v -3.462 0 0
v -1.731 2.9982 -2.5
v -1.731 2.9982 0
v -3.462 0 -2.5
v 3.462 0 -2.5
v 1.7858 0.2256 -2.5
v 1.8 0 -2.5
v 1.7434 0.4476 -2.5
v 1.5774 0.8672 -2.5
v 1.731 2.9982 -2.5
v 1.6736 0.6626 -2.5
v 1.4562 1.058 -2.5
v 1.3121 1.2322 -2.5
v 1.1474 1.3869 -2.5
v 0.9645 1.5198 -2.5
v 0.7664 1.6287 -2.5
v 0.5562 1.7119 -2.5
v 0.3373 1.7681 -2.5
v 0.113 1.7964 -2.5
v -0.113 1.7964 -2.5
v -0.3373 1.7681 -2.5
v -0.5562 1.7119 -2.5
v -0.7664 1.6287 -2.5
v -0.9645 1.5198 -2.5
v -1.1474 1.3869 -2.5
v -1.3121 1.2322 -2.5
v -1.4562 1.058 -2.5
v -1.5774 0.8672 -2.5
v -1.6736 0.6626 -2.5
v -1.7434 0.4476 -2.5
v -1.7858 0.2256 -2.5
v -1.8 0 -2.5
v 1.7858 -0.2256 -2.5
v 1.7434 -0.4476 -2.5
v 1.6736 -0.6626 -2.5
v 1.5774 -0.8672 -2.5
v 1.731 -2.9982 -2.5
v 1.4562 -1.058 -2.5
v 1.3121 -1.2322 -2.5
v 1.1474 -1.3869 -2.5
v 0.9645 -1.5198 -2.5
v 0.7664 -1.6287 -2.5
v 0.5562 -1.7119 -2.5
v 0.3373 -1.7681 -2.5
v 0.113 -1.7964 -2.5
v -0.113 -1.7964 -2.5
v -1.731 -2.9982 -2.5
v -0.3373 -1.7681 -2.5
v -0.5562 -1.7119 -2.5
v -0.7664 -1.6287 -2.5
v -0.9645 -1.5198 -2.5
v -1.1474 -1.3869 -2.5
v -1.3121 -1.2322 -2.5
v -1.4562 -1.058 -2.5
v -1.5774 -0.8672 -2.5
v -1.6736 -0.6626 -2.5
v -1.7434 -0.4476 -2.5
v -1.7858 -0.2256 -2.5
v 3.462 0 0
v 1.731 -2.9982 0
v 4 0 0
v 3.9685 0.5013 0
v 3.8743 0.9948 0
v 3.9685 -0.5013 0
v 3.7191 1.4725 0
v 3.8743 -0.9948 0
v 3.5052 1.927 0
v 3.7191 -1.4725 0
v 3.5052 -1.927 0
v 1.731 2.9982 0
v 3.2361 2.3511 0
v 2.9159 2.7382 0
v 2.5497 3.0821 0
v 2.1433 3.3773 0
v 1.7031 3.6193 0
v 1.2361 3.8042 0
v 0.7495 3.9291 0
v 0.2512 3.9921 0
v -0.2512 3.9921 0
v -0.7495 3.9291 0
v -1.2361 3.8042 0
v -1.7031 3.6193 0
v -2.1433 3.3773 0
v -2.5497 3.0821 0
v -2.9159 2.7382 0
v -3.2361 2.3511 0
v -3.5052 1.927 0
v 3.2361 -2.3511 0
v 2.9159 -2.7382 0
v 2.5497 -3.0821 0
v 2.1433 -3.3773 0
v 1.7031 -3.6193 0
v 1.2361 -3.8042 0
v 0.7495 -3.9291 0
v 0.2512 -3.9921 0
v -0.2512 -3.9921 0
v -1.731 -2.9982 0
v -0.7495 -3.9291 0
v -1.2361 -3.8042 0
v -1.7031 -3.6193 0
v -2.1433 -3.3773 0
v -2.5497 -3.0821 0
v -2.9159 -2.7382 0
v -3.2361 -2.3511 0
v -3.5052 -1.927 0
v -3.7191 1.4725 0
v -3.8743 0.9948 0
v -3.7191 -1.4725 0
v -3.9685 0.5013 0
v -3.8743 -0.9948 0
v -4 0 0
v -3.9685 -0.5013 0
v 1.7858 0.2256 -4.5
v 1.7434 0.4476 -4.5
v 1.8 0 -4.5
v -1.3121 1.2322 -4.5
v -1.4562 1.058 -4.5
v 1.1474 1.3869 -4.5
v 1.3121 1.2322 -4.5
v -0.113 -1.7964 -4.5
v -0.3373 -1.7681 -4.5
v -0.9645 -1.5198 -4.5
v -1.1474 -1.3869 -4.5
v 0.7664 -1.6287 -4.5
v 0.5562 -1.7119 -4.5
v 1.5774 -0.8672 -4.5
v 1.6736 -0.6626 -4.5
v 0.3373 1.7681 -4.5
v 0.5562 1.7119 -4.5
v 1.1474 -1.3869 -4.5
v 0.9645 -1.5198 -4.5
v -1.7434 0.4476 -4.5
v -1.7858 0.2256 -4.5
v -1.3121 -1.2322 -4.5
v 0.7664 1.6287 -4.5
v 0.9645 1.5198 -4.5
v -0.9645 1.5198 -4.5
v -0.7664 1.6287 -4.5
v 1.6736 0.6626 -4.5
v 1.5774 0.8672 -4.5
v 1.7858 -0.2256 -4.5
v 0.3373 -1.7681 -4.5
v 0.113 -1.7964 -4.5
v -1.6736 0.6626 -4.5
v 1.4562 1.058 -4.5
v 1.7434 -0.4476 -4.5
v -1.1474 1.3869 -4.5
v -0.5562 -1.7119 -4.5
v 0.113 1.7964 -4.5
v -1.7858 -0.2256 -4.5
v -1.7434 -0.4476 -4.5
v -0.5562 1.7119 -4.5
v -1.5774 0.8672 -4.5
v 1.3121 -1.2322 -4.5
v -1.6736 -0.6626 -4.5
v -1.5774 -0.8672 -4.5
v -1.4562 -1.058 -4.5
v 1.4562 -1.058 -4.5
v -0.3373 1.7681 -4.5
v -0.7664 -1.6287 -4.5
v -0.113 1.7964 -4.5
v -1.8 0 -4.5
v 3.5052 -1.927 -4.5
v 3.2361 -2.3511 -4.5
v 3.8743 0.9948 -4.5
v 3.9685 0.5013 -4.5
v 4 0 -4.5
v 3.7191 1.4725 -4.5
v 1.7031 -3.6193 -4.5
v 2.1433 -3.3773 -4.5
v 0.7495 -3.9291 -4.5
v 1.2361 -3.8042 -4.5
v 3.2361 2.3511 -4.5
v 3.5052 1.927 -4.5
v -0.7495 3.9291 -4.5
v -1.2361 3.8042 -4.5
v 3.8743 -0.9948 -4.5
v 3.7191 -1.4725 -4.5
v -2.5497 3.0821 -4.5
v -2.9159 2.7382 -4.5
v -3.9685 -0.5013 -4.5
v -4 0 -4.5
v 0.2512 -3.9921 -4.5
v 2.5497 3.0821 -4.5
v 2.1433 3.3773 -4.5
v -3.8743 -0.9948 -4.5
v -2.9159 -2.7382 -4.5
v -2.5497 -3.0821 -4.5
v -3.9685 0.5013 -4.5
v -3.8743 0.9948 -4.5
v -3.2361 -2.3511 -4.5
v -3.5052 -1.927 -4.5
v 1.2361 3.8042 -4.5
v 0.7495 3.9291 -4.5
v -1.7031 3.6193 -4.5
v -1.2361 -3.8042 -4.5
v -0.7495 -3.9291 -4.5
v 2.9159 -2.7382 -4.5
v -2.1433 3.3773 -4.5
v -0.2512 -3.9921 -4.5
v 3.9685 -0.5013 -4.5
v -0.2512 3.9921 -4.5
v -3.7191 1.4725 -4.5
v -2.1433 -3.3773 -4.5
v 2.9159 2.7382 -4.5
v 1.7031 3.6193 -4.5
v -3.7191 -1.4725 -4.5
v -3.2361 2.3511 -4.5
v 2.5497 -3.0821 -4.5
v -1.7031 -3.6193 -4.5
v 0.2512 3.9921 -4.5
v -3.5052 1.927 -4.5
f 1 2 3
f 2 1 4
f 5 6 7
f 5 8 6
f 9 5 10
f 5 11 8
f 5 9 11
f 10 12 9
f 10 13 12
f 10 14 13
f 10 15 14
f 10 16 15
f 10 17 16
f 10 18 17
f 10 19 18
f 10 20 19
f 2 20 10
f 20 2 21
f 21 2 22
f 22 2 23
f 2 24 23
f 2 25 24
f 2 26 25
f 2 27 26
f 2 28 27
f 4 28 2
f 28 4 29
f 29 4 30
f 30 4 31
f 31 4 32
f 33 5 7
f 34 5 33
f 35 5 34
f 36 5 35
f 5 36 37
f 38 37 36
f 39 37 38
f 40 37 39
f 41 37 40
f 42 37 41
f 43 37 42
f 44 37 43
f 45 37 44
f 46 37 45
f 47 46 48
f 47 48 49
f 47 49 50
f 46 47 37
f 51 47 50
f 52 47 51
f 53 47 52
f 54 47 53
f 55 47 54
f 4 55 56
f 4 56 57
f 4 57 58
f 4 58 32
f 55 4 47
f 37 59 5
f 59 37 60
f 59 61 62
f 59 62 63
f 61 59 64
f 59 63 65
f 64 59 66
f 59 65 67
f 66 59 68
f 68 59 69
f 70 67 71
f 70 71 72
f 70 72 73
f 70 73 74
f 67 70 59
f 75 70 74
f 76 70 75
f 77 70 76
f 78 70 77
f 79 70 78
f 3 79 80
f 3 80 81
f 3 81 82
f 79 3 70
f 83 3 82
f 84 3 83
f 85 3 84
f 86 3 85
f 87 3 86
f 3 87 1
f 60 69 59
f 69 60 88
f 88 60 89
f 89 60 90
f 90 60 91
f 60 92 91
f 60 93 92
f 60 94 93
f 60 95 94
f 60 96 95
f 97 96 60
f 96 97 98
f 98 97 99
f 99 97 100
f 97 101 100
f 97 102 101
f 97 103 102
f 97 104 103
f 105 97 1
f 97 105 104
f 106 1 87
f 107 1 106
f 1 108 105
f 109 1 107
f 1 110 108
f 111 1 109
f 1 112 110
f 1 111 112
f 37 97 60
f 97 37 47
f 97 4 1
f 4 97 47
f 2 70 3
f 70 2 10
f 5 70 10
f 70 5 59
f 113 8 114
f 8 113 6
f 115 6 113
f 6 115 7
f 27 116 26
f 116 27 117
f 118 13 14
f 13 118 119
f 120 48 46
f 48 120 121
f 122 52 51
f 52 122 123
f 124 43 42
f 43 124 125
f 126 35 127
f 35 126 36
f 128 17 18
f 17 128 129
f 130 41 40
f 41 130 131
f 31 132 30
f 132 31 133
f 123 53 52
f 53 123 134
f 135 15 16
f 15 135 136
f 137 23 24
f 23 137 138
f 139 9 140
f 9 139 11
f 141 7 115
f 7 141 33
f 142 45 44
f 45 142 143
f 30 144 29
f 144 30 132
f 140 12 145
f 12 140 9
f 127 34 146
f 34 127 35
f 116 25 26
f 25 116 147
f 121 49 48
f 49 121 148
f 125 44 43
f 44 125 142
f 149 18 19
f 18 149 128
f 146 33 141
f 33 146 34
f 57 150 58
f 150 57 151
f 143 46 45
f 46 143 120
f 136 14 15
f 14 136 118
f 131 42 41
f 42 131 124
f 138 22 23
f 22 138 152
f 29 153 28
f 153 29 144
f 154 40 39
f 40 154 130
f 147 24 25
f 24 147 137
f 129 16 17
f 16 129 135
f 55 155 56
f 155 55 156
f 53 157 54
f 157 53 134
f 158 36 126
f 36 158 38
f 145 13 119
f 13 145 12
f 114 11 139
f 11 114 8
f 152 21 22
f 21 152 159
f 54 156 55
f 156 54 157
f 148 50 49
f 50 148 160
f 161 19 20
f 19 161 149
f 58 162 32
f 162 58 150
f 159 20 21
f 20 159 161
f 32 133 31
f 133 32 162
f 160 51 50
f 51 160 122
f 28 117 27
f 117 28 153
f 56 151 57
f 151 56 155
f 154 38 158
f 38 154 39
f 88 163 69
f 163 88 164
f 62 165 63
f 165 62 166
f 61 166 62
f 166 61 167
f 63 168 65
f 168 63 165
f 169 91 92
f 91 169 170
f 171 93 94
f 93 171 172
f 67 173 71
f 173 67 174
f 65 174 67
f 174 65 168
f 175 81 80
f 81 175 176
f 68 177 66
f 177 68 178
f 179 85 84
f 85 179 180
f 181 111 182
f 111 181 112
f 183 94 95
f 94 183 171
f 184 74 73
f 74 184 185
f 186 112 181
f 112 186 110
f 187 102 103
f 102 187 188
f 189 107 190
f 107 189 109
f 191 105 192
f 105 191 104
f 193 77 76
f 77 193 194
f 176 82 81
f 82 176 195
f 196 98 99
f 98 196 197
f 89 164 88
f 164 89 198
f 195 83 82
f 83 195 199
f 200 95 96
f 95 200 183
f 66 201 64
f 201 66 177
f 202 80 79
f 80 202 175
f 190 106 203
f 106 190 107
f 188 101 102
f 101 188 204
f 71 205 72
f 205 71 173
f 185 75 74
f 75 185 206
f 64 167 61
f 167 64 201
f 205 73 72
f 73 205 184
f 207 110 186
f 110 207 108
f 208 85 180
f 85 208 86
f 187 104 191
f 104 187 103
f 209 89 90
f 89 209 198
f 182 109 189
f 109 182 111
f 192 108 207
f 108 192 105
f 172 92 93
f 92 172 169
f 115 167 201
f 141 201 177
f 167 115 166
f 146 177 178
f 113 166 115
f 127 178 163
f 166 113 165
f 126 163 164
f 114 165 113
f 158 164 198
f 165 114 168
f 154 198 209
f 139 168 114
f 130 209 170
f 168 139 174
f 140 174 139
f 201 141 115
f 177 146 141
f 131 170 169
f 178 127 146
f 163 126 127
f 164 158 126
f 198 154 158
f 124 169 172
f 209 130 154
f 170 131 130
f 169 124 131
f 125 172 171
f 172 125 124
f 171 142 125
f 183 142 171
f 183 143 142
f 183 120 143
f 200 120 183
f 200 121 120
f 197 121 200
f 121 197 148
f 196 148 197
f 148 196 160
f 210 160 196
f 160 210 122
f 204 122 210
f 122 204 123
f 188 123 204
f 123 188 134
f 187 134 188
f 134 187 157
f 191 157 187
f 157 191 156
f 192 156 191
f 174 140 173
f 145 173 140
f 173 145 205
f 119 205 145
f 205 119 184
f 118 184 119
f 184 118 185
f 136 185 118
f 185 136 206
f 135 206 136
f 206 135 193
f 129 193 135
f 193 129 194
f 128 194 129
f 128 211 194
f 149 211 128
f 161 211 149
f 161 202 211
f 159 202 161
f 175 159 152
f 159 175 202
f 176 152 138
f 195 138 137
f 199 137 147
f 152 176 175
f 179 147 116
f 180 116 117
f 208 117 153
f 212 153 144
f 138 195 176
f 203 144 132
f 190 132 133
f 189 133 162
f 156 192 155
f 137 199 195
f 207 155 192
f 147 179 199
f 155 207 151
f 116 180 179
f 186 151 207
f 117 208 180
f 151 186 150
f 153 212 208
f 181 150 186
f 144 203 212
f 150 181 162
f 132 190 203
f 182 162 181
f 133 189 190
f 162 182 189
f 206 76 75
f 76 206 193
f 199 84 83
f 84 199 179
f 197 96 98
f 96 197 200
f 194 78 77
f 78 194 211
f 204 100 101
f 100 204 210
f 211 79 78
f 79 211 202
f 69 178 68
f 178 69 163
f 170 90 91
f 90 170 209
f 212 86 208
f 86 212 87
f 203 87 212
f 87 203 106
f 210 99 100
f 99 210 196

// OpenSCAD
$fn = 50;

difference() {
	union() {
		translate(v = [0, 0, -4.5]) {
			cylinder(h = 7.5, r = 4.0);
		}
	}
	union() {
		translate(v = [0, 0, 0]) {
			rotate(a = [0, 0, 0]) {
				difference() {
					union() {
						translate(v = [0, 0, -2.5]) {
							linear_extrude(height = 2.5) {
								polygon(points = [[3.4619999999999997, 0.0], [1.7310000000000003, 2.9981799479017264], [-1.7309999999999992, 2.9981799479017264], [-3.4619999999999997, 4.2397272186481365e-16], [-1.7310000000000014, -2.998179947901726], [1.7309999999999977, -2.9981799479017277]]);
							}
						}
					}
					union();
				}
			}
		}
		#cylinder(h = 3, r = 5.0);
		#translate(v = [0, 0, -100.0]) {
			cylinder(h = 200, r = 1.8);
		}
	}
}
